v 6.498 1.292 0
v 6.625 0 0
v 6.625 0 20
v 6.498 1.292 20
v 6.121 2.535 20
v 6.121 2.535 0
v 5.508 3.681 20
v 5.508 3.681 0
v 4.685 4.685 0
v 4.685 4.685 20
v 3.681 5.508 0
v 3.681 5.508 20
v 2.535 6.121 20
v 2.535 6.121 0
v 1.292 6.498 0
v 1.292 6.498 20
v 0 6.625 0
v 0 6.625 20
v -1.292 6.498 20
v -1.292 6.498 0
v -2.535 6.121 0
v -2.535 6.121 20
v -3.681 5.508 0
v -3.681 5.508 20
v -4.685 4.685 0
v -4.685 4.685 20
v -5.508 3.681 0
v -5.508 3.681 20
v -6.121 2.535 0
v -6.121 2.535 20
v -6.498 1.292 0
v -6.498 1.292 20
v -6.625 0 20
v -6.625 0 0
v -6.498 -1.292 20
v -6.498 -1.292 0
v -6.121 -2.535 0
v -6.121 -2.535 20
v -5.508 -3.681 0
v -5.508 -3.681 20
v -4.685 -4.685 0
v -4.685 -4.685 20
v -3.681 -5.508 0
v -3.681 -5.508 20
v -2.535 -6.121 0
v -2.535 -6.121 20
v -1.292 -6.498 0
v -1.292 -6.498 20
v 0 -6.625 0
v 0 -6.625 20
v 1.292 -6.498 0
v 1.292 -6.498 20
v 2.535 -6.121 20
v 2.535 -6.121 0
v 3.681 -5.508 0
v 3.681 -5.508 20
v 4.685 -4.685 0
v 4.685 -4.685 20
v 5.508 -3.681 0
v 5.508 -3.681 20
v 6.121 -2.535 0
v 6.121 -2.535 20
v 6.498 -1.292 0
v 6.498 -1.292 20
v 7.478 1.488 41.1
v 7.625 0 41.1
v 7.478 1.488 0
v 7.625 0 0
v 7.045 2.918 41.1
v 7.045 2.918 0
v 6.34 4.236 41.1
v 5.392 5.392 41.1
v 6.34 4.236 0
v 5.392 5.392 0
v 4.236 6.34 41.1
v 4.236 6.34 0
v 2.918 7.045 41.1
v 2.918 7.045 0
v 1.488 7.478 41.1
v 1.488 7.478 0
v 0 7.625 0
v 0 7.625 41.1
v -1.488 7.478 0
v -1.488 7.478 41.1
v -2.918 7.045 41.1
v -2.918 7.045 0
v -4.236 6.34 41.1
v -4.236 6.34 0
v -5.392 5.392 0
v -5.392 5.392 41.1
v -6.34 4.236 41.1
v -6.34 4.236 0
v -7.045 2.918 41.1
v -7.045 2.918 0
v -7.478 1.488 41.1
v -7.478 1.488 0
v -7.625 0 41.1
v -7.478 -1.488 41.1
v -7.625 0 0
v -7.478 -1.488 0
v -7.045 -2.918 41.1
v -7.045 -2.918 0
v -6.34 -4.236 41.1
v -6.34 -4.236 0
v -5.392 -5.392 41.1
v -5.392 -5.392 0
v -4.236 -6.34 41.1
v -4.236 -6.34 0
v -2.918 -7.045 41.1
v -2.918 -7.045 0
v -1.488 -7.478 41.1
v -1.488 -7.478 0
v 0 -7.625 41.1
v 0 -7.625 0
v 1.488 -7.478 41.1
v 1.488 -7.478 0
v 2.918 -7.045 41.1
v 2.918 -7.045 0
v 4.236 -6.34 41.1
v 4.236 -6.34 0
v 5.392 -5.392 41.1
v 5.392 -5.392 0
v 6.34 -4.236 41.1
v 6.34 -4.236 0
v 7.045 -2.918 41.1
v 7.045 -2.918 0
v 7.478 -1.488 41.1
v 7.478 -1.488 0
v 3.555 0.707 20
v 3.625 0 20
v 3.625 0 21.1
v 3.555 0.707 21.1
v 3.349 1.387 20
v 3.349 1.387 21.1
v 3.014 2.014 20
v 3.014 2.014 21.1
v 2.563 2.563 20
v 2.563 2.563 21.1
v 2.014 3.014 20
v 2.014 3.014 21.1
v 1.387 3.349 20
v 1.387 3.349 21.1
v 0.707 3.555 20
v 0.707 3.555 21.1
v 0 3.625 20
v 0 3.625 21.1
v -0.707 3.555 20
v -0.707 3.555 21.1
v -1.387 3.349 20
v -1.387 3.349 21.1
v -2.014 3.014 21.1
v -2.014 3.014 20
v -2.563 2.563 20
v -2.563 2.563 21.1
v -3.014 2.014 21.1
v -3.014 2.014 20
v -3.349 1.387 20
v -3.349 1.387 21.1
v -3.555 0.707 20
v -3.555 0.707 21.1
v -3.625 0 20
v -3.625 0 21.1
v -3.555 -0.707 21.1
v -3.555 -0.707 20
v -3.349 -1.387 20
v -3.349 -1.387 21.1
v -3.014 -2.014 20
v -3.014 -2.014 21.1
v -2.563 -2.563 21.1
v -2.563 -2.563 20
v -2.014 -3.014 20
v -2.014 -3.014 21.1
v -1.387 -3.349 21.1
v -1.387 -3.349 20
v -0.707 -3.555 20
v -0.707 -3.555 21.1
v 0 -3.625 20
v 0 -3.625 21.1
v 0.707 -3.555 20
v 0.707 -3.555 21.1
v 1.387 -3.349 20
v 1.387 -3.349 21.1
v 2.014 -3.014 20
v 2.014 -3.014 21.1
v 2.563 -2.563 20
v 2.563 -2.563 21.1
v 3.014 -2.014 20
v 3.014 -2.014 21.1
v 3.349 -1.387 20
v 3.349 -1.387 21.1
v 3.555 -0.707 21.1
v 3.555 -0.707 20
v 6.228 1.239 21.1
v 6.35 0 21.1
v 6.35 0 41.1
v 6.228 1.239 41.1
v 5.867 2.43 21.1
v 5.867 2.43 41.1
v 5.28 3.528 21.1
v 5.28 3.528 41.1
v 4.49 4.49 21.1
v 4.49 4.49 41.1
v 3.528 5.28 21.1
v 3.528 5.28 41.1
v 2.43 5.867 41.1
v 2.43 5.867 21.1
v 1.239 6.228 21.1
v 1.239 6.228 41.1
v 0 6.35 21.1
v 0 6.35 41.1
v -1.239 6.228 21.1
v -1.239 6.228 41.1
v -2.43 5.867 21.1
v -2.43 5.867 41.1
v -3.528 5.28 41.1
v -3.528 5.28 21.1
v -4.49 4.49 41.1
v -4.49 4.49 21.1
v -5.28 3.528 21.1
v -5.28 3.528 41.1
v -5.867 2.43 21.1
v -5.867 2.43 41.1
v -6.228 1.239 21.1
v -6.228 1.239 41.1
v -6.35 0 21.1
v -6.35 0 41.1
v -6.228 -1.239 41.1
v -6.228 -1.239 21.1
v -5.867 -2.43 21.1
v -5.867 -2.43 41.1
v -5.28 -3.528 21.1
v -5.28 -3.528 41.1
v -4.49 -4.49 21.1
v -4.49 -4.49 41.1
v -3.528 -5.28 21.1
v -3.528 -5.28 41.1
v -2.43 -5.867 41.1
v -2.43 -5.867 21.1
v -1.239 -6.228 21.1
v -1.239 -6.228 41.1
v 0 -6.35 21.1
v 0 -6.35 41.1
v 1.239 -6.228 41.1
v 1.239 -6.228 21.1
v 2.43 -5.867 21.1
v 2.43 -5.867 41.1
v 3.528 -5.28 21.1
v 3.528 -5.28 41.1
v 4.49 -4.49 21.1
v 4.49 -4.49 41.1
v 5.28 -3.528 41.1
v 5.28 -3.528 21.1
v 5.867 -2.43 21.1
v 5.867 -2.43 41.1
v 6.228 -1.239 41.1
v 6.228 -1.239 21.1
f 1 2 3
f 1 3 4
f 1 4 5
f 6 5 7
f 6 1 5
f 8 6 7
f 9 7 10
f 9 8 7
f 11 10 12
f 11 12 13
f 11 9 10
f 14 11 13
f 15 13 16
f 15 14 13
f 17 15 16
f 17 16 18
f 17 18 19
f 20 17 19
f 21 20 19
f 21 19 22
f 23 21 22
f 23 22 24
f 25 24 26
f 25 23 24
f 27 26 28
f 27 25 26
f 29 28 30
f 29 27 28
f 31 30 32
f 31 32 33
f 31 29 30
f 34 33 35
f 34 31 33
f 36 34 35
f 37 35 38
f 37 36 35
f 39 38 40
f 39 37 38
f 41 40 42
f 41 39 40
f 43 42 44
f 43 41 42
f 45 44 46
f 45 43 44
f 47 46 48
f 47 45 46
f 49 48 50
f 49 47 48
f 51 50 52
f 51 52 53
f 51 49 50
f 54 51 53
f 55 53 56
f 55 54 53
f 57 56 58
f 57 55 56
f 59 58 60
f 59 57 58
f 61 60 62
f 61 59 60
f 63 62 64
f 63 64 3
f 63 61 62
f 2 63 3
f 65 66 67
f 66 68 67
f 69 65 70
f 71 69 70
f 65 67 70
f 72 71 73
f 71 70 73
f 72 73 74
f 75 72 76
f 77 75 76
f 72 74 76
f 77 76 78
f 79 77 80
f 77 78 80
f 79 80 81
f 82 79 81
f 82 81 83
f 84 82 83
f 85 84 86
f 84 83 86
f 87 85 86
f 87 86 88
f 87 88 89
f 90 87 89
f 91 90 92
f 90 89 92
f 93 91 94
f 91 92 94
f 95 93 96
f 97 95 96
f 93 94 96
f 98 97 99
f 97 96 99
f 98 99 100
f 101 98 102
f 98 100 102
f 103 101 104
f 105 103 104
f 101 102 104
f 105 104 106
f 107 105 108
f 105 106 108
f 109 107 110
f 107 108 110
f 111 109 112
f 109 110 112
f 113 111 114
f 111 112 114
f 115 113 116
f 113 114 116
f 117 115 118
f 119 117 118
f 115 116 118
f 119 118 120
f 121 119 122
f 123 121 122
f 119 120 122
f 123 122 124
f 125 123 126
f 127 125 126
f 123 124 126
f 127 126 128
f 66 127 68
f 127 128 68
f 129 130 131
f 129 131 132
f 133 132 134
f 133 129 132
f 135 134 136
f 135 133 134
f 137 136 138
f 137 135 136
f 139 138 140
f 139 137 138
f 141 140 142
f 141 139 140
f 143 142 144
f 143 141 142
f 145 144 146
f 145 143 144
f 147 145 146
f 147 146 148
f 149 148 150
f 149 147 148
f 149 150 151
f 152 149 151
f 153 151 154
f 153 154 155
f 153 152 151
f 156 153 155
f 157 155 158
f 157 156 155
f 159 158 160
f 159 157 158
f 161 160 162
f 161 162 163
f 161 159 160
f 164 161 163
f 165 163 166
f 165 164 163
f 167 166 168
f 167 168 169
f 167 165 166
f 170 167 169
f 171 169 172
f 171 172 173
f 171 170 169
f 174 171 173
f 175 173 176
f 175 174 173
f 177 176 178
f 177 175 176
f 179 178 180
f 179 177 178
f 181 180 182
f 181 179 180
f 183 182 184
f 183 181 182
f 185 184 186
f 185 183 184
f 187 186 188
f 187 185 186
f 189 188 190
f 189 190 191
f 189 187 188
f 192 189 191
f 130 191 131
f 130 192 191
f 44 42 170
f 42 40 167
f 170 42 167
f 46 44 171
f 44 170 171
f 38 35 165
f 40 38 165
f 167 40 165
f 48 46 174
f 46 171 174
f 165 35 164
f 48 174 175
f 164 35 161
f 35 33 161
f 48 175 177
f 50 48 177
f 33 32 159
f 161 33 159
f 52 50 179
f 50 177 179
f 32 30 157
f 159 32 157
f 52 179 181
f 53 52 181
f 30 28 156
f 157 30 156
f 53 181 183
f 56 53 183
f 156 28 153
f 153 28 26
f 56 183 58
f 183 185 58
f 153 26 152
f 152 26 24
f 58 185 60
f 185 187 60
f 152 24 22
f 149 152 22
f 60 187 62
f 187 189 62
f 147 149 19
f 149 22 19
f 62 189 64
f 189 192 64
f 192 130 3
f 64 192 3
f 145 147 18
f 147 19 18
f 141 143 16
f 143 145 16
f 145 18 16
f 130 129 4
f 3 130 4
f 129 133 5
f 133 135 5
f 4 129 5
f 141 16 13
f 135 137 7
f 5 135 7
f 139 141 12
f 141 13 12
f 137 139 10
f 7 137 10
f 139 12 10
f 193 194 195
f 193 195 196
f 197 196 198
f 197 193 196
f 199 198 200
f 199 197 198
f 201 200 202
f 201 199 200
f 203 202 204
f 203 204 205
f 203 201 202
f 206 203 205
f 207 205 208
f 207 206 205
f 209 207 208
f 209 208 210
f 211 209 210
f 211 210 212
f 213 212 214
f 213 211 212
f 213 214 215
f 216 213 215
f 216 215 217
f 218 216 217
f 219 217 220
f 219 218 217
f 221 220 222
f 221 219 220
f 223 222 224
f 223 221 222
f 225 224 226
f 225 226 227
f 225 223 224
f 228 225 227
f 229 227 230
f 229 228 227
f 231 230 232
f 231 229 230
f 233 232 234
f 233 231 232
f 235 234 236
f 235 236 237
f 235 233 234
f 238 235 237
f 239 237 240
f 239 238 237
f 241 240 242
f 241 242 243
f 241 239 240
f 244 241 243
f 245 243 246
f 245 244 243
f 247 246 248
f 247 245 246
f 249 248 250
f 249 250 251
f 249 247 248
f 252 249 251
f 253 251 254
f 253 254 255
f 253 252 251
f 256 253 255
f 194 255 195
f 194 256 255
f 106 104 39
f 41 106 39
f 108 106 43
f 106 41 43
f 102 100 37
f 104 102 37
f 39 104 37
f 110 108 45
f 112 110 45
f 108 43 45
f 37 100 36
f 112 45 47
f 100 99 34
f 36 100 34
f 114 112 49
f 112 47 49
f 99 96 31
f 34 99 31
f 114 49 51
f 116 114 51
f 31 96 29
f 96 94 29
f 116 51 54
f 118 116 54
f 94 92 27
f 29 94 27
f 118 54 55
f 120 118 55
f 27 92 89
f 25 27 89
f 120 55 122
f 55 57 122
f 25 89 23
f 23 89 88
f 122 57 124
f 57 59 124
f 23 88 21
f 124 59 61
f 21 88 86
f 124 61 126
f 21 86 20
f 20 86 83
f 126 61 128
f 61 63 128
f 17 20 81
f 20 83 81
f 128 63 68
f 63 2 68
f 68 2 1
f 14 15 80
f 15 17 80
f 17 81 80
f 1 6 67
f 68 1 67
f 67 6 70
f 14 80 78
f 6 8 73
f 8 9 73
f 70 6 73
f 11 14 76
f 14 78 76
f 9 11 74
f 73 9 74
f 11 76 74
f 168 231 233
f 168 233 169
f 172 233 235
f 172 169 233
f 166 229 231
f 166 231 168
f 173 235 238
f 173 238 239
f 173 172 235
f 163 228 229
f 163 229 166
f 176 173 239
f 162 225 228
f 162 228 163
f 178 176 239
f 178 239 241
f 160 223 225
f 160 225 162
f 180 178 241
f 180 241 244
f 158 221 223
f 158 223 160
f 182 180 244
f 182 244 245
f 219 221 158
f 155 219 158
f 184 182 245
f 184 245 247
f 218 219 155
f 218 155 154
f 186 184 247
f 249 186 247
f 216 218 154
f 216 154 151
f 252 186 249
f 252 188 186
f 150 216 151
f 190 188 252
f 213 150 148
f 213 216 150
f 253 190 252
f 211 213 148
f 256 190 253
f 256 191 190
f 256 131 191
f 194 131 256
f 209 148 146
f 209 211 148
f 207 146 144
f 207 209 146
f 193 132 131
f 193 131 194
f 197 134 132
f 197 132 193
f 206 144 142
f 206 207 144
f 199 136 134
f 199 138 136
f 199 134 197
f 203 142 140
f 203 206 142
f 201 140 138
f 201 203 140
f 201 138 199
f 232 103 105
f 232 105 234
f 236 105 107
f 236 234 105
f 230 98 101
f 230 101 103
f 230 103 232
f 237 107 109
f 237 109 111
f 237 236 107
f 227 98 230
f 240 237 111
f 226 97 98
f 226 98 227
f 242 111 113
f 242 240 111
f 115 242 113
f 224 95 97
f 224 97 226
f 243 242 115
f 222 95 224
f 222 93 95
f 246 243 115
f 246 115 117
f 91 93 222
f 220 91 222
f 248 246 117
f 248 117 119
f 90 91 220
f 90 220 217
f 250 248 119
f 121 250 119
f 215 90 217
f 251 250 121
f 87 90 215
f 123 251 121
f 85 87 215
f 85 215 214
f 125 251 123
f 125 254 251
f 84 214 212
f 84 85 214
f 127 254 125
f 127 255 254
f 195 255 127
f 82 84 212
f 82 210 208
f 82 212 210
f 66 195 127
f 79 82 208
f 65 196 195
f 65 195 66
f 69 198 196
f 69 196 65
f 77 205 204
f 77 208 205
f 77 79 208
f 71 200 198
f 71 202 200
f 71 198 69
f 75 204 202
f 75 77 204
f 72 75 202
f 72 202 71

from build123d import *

# Parameters (mm, degrees)
F0_R     = 7.625
F0_R_2   = 6.625
F1_DEPTH = 20
F2_R     = 7.625
F2_R_2   = 6.625
F2_R_3   = 3.625
F3_DEPTH = 1.1
F4_R     = 7.625
F4_R_2   = 6.35
F5_DEPTH = 20


with BuildPart() as f1:
    # F0 (on Top) → F1 (new body)
    with BuildSketch(Plane.XY):
        Circle(F0_R)
        Circle(F0_R_2, mode=Mode.SUBTRACT)
    extrude(amount=F1_DEPTH)

    # F2 (on face) → F3 (join)
    with BuildSketch(Plane.XY.offset(20)):
        Circle(F2_R)
        Circle(F2_R_2, mode=Mode.SUBTRACT)
        Circle(F2_R_2)
        Circle(F2_R_3, mode=Mode.SUBTRACT)
    extrude(amount=F3_DEPTH)

    # F4 (on face) → F5 (join)
    with BuildSketch(Plane.XY.offset(21.1)):
        Circle(F4_R)
        Circle(F4_R_2, mode=Mode.SUBTRACT)
    extrude(amount=F5_DEPTH)


solid = f1.part
